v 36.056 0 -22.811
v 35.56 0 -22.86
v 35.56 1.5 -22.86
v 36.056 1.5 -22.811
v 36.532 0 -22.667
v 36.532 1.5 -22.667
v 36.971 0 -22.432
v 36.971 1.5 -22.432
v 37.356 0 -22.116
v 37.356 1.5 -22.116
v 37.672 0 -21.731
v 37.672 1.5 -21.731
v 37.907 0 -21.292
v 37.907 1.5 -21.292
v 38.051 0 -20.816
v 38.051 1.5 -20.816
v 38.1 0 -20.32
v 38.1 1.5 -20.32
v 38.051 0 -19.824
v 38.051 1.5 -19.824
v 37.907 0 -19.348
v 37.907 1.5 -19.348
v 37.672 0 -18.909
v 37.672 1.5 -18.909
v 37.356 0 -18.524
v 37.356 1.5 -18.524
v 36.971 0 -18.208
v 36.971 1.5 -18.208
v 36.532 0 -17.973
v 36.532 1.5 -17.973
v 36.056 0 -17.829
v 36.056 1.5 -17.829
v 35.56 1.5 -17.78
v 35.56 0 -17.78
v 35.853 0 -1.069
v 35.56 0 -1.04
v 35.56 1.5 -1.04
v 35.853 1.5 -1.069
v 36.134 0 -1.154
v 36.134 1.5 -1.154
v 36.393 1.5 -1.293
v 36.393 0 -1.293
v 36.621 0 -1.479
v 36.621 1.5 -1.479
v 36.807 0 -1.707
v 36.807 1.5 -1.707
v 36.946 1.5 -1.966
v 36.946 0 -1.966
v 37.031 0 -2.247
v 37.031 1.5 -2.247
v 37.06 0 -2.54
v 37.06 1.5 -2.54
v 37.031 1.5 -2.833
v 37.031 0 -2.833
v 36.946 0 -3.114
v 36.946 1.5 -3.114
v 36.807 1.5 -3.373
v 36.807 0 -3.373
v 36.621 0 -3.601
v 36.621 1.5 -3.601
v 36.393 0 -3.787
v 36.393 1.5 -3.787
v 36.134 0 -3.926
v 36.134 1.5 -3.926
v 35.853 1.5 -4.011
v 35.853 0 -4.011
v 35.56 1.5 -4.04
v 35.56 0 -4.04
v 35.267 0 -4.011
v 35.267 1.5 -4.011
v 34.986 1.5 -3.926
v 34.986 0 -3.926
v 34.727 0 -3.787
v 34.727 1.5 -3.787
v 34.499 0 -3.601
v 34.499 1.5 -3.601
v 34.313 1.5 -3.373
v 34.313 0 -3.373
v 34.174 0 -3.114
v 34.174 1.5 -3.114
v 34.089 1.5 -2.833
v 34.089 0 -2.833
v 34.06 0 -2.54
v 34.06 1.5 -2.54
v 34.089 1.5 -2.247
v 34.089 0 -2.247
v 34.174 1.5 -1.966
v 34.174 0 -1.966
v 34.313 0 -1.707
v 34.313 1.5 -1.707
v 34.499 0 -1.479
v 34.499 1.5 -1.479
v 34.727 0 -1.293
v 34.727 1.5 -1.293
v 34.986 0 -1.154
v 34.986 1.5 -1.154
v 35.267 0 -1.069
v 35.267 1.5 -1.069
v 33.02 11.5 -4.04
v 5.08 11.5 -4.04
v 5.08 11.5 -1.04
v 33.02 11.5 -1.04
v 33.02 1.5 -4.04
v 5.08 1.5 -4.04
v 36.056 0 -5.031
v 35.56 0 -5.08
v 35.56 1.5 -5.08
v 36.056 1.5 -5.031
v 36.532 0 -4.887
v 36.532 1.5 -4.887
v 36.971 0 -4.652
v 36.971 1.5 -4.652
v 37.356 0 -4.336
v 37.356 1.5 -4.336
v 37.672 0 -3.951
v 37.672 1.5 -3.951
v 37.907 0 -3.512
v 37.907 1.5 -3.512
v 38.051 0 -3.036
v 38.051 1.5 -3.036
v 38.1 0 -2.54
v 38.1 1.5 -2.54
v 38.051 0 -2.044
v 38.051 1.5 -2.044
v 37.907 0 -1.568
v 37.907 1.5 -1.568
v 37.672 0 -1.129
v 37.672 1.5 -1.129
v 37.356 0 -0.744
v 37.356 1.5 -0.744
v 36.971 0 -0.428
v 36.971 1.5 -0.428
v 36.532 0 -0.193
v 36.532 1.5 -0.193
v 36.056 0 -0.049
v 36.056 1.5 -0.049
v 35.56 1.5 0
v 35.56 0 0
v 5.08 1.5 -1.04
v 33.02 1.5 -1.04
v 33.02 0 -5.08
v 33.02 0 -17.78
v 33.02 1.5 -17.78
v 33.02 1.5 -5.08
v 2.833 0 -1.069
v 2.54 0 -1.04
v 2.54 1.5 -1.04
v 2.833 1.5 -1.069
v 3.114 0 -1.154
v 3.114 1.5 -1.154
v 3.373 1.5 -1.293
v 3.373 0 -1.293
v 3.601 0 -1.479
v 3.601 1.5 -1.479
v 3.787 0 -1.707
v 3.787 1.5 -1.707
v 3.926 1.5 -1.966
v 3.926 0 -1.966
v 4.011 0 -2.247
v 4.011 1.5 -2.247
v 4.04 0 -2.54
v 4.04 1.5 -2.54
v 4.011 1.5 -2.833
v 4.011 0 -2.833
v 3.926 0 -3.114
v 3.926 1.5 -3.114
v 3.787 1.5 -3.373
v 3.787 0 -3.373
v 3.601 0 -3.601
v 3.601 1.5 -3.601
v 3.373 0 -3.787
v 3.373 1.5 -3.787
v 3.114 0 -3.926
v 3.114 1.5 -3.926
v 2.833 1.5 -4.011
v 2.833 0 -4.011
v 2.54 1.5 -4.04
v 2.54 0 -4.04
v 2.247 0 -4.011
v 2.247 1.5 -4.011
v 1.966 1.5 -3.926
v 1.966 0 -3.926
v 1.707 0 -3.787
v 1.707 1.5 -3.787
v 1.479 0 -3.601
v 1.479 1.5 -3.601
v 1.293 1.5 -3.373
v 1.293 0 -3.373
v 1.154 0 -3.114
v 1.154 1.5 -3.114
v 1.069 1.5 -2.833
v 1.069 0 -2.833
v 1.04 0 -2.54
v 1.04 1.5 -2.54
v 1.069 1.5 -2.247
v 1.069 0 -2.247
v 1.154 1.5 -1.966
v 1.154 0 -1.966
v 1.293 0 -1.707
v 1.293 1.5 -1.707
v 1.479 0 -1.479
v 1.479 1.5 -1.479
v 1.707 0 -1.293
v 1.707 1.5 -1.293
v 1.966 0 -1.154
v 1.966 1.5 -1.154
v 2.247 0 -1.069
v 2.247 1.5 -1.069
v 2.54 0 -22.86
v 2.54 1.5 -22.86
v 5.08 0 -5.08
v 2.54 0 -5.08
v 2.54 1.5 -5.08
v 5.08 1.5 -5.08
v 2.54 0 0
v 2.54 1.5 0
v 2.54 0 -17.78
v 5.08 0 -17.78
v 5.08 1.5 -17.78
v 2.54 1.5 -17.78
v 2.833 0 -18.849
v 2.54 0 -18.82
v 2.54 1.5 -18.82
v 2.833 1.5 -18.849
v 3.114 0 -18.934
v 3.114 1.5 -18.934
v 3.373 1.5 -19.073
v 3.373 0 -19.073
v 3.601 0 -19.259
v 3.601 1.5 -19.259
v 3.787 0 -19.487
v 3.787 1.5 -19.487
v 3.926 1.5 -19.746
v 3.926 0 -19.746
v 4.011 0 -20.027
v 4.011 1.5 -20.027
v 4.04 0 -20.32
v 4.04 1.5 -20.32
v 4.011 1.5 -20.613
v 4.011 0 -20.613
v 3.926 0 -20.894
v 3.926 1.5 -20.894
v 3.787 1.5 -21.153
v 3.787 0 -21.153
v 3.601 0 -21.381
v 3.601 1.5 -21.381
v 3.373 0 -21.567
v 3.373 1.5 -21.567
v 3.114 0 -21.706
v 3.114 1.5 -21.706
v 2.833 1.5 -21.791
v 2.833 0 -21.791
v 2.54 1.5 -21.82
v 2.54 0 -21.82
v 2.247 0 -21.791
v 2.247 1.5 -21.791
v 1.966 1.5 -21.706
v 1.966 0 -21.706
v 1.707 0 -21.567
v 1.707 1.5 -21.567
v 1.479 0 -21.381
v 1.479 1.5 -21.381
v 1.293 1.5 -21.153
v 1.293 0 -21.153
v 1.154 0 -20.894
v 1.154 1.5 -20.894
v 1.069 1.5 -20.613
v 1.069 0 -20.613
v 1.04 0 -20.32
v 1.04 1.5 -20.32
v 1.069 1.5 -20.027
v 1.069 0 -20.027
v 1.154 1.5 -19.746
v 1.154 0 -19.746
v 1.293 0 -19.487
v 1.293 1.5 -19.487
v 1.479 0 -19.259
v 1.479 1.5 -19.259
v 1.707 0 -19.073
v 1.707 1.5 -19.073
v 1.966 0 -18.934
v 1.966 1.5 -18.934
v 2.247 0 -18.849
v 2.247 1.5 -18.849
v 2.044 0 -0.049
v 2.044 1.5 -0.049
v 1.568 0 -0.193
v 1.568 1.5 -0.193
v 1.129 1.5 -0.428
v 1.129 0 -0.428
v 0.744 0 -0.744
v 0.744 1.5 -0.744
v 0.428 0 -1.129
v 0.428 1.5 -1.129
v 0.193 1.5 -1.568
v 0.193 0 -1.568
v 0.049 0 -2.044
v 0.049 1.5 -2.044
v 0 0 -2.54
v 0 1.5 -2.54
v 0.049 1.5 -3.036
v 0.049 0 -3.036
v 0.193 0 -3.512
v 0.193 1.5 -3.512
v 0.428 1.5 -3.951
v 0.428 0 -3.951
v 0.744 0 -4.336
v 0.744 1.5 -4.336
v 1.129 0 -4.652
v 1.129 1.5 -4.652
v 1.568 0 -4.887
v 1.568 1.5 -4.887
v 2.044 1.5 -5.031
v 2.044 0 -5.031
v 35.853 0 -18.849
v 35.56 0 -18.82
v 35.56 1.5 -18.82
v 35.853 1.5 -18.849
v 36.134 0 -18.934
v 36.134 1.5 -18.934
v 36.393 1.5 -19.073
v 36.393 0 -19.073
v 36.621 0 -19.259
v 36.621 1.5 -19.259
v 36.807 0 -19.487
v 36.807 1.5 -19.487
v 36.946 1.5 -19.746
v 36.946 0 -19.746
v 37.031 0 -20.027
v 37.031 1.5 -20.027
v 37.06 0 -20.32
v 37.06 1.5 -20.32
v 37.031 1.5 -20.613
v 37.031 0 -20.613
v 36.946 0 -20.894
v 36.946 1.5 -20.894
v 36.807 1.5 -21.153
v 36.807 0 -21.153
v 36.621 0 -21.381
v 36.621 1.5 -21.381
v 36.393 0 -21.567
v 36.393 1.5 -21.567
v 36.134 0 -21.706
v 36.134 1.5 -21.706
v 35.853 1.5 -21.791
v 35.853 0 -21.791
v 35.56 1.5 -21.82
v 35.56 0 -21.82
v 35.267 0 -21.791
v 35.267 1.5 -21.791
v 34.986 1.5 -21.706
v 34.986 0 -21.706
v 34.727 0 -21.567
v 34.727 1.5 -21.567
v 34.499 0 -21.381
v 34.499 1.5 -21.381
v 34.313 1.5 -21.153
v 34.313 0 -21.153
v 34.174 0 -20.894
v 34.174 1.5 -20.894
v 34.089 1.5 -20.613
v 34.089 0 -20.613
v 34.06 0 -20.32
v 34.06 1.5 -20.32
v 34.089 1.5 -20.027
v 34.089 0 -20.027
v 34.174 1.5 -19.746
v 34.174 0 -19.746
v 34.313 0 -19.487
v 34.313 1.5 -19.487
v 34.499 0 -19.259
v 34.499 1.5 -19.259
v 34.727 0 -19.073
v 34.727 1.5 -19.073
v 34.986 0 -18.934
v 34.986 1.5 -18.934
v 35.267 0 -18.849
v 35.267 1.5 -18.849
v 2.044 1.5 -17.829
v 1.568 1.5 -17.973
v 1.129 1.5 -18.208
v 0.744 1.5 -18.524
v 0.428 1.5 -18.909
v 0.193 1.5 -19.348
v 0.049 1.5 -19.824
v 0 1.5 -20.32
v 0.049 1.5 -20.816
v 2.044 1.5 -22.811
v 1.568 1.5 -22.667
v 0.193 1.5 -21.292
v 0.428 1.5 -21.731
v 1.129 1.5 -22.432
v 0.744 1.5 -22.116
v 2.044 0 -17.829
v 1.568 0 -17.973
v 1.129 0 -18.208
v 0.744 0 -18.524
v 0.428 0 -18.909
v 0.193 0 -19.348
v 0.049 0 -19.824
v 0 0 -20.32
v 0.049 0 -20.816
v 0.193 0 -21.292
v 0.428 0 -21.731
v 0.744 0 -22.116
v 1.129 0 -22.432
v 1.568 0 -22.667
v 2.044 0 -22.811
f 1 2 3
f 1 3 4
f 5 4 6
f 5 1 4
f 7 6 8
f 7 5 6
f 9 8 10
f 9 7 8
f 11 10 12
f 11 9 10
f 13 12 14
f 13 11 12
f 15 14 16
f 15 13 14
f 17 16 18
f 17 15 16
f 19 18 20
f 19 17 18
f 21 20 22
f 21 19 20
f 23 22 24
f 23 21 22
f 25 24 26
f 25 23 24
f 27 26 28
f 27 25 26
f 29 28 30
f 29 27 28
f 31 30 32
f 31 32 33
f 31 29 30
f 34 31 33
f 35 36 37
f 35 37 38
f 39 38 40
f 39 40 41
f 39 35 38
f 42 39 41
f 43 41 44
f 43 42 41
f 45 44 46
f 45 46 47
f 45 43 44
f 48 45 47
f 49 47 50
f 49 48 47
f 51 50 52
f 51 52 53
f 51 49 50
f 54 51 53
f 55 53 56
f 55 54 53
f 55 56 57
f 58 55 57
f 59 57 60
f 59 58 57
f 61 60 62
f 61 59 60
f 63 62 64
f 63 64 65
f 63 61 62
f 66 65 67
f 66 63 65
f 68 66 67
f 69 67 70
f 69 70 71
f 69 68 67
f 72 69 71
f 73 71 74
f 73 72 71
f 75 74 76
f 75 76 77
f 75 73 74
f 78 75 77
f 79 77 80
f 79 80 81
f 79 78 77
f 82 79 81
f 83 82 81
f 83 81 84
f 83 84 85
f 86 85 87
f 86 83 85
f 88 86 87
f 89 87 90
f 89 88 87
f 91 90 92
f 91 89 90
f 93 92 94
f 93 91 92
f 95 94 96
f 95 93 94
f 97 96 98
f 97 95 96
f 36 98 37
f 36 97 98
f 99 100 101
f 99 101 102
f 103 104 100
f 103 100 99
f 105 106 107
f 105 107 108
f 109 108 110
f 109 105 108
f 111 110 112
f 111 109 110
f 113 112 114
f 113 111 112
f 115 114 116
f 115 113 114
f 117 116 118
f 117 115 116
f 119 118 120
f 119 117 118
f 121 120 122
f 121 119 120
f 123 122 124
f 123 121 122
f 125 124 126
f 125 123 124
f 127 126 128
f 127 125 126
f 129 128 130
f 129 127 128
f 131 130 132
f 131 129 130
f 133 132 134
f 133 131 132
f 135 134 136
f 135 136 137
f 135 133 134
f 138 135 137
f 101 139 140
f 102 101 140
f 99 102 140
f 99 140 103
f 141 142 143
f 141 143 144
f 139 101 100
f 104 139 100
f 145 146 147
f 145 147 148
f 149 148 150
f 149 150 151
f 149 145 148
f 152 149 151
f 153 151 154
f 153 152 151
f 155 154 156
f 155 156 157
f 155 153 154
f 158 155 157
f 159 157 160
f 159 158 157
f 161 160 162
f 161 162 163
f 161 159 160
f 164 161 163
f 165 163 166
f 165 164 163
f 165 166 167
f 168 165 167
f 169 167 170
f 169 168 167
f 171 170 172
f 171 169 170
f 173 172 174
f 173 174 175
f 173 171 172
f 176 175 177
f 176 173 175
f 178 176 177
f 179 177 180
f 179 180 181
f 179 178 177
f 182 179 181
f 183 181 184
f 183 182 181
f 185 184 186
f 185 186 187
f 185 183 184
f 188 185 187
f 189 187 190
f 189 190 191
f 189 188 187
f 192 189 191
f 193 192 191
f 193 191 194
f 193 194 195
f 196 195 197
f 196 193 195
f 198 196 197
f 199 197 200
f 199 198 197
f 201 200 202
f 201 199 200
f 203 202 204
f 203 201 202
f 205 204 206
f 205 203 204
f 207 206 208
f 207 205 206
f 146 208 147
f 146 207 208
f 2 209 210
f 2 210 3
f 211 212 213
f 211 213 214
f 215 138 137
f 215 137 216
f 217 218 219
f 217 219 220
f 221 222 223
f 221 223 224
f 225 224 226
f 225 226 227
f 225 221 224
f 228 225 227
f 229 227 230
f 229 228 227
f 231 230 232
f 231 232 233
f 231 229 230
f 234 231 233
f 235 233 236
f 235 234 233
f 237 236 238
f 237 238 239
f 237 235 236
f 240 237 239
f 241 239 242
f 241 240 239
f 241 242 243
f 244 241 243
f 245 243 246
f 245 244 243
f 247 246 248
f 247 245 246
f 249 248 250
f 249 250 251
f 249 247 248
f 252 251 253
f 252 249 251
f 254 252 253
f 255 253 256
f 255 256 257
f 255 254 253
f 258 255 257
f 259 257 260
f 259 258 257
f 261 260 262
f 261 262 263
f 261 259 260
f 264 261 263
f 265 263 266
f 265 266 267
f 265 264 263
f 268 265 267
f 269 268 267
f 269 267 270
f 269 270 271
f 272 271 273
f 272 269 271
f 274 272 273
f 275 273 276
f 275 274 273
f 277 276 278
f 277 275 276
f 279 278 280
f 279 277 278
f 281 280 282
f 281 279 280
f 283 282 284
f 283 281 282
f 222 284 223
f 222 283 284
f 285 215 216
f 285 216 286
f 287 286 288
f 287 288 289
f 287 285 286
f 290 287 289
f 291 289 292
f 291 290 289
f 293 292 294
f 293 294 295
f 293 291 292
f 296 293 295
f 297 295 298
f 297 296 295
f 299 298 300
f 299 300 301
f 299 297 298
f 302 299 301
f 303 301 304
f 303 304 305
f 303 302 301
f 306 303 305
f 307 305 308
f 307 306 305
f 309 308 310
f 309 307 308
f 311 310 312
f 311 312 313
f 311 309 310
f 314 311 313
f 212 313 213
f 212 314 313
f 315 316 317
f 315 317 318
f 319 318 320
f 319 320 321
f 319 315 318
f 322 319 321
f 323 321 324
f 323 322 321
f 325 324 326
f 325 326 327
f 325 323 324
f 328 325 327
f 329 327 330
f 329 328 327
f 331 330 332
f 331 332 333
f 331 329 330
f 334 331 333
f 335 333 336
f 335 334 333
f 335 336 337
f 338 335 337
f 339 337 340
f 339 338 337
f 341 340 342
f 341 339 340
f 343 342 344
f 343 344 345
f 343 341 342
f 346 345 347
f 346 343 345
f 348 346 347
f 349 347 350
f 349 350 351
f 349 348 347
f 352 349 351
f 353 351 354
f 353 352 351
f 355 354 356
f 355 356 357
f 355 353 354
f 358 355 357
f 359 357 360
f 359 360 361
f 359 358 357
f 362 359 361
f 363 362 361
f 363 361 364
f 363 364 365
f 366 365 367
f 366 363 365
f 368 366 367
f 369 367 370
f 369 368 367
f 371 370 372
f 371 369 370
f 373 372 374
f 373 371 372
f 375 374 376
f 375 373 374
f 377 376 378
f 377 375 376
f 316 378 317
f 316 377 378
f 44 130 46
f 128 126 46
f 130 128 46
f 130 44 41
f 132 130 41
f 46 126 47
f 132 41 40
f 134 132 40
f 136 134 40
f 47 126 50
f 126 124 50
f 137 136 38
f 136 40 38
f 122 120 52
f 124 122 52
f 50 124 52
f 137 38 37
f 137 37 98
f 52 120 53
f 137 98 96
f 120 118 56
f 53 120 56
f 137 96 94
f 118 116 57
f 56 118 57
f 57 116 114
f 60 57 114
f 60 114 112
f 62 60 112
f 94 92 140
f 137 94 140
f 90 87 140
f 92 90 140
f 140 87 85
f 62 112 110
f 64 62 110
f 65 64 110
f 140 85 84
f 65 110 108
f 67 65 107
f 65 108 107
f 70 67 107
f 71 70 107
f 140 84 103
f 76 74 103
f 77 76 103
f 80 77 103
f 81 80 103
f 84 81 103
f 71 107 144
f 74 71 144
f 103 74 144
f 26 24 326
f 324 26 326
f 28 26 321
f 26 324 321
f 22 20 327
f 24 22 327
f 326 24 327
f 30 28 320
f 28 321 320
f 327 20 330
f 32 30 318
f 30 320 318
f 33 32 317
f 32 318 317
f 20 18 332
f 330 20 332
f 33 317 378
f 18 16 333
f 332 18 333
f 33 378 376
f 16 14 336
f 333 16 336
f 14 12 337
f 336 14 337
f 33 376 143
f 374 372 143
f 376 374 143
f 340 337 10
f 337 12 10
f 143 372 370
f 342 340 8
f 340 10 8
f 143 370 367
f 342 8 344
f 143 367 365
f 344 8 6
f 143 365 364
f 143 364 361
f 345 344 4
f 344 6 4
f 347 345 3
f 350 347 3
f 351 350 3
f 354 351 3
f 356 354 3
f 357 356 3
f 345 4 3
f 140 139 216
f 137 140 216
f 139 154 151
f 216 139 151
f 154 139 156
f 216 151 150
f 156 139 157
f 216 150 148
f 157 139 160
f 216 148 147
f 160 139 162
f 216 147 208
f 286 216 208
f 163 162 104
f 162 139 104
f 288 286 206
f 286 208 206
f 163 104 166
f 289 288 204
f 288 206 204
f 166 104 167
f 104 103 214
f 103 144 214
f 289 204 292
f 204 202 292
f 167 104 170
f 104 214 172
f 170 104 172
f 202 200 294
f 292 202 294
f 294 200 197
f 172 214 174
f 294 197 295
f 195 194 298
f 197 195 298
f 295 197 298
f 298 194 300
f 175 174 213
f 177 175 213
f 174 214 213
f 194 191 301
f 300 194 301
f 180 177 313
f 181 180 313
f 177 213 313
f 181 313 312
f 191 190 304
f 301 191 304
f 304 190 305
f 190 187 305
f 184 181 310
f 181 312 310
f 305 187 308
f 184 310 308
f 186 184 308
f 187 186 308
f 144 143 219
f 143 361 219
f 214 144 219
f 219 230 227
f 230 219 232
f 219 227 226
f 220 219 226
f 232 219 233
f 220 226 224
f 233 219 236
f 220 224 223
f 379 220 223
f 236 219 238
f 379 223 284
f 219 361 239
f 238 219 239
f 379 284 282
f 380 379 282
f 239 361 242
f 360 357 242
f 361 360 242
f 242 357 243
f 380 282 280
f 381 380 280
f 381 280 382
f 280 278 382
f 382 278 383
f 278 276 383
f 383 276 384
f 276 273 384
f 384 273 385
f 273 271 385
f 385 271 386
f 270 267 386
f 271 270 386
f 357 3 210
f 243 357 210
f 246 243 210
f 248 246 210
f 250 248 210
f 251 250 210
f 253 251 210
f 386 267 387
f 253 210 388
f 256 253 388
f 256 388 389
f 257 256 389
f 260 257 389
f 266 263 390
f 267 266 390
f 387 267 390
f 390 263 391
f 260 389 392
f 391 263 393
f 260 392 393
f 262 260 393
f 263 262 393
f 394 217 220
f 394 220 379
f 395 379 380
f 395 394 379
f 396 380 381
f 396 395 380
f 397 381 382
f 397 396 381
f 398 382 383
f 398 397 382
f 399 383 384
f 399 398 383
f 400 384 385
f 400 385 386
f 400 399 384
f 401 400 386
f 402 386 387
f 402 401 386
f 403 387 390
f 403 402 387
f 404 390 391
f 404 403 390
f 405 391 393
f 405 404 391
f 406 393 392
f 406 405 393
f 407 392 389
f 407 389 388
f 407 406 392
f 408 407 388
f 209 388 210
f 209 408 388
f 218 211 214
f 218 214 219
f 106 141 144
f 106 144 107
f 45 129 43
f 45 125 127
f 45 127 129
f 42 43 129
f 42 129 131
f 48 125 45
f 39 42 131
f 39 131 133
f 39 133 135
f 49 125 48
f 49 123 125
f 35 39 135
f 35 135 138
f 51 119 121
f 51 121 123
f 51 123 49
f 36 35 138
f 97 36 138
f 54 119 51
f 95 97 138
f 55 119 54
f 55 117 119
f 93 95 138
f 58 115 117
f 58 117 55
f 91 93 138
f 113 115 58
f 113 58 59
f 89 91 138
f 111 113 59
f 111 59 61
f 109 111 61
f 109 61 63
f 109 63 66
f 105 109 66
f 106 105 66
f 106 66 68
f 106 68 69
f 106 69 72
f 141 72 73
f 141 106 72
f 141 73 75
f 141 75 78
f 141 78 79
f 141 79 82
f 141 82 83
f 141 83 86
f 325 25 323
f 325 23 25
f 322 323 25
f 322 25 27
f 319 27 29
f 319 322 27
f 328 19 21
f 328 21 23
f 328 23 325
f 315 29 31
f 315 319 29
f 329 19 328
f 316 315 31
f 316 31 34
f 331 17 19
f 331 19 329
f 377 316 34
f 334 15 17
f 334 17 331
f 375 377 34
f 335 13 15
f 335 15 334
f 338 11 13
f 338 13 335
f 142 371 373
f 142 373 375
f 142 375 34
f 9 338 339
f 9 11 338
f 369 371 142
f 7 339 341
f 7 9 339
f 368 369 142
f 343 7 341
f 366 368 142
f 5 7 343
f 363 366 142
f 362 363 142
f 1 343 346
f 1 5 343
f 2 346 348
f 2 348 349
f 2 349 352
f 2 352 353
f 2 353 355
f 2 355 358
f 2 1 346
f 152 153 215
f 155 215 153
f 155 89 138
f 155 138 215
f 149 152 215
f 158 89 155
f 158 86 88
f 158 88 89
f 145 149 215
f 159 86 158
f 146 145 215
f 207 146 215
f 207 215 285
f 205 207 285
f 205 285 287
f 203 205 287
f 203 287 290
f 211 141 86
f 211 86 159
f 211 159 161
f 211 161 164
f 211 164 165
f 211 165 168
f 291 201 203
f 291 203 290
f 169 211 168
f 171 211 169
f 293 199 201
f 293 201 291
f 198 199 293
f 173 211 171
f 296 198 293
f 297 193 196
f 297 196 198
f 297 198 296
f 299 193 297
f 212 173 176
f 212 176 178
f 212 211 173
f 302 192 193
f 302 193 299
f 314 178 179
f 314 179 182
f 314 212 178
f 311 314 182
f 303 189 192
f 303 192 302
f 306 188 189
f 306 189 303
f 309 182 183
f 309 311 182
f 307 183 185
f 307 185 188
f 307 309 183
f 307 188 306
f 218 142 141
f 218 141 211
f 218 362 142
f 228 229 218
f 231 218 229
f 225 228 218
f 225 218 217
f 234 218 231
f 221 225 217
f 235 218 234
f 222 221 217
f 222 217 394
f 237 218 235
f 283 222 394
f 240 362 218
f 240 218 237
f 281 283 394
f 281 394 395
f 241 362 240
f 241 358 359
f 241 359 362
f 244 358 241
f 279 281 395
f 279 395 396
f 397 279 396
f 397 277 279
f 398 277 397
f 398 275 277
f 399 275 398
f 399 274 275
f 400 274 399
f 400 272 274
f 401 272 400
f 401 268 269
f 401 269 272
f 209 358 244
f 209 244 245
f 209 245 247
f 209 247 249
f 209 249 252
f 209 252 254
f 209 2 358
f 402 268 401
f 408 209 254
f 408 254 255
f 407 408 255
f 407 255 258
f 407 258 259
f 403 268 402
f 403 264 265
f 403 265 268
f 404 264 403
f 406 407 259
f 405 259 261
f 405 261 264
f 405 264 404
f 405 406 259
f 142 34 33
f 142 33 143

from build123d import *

# Parameters (mm, degrees)
SKETCH_1_R      = 1.5
EXTRUDE_1_DEPTH = 1.5
SKETCH_2_W      = 27.94
SKETCH_2_H      = 3
EXTRUDE_2_DEPTH = 10


with BuildPart() as part:
    # Эскиз1 → Бобышка-Вытянуть1 (new body)
    with BuildSketch(Plane(origin=(0, 0, 0), x_dir=(1, 0, 0), z_dir=(0, 1, 0))):
        with BuildLine():
            ThreePointArc((35.56, 22.86), (38.1, 20.32), (35.56, 17.78))
            Line((35.56, 17.78), (33.02, 17.78))
            Line((33.02, 17.78), (33.02, 5.08))
            Line((33.02, 5.08), (35.56, 5.08))
            ThreePointArc((35.56, 5.08), (38.1, 2.54), (35.56, 0))
            Line((35.56, 0), (2.54, 0))
            ThreePointArc((2.54, 0), (0, 2.54), (2.54, 5.08))
            Line((2.54, 5.08), (5.08, 5.08))
            Line((5.08, 5.08), (5.08, 17.78))
            Line((5.08, 17.78), (2.54, 17.78))
            ThreePointArc((2.54, 17.78), (0, 20.32), (2.54, 22.86))
            Line((2.54, 22.86), (35.56, 22.86))
        make_face()
        with Locations(Location((35.56, 2.54, 0), (0, 0, 270))):
            Circle(SKETCH_1_R, mode=Mode.SUBTRACT)
        with Locations(Location((2.54, 2.54, 0), (0, 0, 270))):
            Circle(SKETCH_1_R, mode=Mode.SUBTRACT)
        with Locations(Location((2.54, 20.32, 0), (0, 0, 270))):
            Circle(SKETCH_1_R, mode=Mode.SUBTRACT)
        with Locations(Location((35.56, 20.32, 0), (0, 0, 270))):
            Circle(SKETCH_1_R, mode=Mode.SUBTRACT)
    extrude(amount=EXTRUDE_1_DEPTH)

    # Эскиз2 → Бобышка-Вытянуть2 (add)
    with BuildSketch(Plane(origin=(0, 1.5, 0), x_dir=(1, 0, 0), z_dir=(0, 1, 0))):
        with Locations((19.05, 2.54)):
            Rectangle(SKETCH_2_W, SKETCH_2_H)
    extrude(amount=EXTRUDE_2_DEPTH)


solid = part.part
